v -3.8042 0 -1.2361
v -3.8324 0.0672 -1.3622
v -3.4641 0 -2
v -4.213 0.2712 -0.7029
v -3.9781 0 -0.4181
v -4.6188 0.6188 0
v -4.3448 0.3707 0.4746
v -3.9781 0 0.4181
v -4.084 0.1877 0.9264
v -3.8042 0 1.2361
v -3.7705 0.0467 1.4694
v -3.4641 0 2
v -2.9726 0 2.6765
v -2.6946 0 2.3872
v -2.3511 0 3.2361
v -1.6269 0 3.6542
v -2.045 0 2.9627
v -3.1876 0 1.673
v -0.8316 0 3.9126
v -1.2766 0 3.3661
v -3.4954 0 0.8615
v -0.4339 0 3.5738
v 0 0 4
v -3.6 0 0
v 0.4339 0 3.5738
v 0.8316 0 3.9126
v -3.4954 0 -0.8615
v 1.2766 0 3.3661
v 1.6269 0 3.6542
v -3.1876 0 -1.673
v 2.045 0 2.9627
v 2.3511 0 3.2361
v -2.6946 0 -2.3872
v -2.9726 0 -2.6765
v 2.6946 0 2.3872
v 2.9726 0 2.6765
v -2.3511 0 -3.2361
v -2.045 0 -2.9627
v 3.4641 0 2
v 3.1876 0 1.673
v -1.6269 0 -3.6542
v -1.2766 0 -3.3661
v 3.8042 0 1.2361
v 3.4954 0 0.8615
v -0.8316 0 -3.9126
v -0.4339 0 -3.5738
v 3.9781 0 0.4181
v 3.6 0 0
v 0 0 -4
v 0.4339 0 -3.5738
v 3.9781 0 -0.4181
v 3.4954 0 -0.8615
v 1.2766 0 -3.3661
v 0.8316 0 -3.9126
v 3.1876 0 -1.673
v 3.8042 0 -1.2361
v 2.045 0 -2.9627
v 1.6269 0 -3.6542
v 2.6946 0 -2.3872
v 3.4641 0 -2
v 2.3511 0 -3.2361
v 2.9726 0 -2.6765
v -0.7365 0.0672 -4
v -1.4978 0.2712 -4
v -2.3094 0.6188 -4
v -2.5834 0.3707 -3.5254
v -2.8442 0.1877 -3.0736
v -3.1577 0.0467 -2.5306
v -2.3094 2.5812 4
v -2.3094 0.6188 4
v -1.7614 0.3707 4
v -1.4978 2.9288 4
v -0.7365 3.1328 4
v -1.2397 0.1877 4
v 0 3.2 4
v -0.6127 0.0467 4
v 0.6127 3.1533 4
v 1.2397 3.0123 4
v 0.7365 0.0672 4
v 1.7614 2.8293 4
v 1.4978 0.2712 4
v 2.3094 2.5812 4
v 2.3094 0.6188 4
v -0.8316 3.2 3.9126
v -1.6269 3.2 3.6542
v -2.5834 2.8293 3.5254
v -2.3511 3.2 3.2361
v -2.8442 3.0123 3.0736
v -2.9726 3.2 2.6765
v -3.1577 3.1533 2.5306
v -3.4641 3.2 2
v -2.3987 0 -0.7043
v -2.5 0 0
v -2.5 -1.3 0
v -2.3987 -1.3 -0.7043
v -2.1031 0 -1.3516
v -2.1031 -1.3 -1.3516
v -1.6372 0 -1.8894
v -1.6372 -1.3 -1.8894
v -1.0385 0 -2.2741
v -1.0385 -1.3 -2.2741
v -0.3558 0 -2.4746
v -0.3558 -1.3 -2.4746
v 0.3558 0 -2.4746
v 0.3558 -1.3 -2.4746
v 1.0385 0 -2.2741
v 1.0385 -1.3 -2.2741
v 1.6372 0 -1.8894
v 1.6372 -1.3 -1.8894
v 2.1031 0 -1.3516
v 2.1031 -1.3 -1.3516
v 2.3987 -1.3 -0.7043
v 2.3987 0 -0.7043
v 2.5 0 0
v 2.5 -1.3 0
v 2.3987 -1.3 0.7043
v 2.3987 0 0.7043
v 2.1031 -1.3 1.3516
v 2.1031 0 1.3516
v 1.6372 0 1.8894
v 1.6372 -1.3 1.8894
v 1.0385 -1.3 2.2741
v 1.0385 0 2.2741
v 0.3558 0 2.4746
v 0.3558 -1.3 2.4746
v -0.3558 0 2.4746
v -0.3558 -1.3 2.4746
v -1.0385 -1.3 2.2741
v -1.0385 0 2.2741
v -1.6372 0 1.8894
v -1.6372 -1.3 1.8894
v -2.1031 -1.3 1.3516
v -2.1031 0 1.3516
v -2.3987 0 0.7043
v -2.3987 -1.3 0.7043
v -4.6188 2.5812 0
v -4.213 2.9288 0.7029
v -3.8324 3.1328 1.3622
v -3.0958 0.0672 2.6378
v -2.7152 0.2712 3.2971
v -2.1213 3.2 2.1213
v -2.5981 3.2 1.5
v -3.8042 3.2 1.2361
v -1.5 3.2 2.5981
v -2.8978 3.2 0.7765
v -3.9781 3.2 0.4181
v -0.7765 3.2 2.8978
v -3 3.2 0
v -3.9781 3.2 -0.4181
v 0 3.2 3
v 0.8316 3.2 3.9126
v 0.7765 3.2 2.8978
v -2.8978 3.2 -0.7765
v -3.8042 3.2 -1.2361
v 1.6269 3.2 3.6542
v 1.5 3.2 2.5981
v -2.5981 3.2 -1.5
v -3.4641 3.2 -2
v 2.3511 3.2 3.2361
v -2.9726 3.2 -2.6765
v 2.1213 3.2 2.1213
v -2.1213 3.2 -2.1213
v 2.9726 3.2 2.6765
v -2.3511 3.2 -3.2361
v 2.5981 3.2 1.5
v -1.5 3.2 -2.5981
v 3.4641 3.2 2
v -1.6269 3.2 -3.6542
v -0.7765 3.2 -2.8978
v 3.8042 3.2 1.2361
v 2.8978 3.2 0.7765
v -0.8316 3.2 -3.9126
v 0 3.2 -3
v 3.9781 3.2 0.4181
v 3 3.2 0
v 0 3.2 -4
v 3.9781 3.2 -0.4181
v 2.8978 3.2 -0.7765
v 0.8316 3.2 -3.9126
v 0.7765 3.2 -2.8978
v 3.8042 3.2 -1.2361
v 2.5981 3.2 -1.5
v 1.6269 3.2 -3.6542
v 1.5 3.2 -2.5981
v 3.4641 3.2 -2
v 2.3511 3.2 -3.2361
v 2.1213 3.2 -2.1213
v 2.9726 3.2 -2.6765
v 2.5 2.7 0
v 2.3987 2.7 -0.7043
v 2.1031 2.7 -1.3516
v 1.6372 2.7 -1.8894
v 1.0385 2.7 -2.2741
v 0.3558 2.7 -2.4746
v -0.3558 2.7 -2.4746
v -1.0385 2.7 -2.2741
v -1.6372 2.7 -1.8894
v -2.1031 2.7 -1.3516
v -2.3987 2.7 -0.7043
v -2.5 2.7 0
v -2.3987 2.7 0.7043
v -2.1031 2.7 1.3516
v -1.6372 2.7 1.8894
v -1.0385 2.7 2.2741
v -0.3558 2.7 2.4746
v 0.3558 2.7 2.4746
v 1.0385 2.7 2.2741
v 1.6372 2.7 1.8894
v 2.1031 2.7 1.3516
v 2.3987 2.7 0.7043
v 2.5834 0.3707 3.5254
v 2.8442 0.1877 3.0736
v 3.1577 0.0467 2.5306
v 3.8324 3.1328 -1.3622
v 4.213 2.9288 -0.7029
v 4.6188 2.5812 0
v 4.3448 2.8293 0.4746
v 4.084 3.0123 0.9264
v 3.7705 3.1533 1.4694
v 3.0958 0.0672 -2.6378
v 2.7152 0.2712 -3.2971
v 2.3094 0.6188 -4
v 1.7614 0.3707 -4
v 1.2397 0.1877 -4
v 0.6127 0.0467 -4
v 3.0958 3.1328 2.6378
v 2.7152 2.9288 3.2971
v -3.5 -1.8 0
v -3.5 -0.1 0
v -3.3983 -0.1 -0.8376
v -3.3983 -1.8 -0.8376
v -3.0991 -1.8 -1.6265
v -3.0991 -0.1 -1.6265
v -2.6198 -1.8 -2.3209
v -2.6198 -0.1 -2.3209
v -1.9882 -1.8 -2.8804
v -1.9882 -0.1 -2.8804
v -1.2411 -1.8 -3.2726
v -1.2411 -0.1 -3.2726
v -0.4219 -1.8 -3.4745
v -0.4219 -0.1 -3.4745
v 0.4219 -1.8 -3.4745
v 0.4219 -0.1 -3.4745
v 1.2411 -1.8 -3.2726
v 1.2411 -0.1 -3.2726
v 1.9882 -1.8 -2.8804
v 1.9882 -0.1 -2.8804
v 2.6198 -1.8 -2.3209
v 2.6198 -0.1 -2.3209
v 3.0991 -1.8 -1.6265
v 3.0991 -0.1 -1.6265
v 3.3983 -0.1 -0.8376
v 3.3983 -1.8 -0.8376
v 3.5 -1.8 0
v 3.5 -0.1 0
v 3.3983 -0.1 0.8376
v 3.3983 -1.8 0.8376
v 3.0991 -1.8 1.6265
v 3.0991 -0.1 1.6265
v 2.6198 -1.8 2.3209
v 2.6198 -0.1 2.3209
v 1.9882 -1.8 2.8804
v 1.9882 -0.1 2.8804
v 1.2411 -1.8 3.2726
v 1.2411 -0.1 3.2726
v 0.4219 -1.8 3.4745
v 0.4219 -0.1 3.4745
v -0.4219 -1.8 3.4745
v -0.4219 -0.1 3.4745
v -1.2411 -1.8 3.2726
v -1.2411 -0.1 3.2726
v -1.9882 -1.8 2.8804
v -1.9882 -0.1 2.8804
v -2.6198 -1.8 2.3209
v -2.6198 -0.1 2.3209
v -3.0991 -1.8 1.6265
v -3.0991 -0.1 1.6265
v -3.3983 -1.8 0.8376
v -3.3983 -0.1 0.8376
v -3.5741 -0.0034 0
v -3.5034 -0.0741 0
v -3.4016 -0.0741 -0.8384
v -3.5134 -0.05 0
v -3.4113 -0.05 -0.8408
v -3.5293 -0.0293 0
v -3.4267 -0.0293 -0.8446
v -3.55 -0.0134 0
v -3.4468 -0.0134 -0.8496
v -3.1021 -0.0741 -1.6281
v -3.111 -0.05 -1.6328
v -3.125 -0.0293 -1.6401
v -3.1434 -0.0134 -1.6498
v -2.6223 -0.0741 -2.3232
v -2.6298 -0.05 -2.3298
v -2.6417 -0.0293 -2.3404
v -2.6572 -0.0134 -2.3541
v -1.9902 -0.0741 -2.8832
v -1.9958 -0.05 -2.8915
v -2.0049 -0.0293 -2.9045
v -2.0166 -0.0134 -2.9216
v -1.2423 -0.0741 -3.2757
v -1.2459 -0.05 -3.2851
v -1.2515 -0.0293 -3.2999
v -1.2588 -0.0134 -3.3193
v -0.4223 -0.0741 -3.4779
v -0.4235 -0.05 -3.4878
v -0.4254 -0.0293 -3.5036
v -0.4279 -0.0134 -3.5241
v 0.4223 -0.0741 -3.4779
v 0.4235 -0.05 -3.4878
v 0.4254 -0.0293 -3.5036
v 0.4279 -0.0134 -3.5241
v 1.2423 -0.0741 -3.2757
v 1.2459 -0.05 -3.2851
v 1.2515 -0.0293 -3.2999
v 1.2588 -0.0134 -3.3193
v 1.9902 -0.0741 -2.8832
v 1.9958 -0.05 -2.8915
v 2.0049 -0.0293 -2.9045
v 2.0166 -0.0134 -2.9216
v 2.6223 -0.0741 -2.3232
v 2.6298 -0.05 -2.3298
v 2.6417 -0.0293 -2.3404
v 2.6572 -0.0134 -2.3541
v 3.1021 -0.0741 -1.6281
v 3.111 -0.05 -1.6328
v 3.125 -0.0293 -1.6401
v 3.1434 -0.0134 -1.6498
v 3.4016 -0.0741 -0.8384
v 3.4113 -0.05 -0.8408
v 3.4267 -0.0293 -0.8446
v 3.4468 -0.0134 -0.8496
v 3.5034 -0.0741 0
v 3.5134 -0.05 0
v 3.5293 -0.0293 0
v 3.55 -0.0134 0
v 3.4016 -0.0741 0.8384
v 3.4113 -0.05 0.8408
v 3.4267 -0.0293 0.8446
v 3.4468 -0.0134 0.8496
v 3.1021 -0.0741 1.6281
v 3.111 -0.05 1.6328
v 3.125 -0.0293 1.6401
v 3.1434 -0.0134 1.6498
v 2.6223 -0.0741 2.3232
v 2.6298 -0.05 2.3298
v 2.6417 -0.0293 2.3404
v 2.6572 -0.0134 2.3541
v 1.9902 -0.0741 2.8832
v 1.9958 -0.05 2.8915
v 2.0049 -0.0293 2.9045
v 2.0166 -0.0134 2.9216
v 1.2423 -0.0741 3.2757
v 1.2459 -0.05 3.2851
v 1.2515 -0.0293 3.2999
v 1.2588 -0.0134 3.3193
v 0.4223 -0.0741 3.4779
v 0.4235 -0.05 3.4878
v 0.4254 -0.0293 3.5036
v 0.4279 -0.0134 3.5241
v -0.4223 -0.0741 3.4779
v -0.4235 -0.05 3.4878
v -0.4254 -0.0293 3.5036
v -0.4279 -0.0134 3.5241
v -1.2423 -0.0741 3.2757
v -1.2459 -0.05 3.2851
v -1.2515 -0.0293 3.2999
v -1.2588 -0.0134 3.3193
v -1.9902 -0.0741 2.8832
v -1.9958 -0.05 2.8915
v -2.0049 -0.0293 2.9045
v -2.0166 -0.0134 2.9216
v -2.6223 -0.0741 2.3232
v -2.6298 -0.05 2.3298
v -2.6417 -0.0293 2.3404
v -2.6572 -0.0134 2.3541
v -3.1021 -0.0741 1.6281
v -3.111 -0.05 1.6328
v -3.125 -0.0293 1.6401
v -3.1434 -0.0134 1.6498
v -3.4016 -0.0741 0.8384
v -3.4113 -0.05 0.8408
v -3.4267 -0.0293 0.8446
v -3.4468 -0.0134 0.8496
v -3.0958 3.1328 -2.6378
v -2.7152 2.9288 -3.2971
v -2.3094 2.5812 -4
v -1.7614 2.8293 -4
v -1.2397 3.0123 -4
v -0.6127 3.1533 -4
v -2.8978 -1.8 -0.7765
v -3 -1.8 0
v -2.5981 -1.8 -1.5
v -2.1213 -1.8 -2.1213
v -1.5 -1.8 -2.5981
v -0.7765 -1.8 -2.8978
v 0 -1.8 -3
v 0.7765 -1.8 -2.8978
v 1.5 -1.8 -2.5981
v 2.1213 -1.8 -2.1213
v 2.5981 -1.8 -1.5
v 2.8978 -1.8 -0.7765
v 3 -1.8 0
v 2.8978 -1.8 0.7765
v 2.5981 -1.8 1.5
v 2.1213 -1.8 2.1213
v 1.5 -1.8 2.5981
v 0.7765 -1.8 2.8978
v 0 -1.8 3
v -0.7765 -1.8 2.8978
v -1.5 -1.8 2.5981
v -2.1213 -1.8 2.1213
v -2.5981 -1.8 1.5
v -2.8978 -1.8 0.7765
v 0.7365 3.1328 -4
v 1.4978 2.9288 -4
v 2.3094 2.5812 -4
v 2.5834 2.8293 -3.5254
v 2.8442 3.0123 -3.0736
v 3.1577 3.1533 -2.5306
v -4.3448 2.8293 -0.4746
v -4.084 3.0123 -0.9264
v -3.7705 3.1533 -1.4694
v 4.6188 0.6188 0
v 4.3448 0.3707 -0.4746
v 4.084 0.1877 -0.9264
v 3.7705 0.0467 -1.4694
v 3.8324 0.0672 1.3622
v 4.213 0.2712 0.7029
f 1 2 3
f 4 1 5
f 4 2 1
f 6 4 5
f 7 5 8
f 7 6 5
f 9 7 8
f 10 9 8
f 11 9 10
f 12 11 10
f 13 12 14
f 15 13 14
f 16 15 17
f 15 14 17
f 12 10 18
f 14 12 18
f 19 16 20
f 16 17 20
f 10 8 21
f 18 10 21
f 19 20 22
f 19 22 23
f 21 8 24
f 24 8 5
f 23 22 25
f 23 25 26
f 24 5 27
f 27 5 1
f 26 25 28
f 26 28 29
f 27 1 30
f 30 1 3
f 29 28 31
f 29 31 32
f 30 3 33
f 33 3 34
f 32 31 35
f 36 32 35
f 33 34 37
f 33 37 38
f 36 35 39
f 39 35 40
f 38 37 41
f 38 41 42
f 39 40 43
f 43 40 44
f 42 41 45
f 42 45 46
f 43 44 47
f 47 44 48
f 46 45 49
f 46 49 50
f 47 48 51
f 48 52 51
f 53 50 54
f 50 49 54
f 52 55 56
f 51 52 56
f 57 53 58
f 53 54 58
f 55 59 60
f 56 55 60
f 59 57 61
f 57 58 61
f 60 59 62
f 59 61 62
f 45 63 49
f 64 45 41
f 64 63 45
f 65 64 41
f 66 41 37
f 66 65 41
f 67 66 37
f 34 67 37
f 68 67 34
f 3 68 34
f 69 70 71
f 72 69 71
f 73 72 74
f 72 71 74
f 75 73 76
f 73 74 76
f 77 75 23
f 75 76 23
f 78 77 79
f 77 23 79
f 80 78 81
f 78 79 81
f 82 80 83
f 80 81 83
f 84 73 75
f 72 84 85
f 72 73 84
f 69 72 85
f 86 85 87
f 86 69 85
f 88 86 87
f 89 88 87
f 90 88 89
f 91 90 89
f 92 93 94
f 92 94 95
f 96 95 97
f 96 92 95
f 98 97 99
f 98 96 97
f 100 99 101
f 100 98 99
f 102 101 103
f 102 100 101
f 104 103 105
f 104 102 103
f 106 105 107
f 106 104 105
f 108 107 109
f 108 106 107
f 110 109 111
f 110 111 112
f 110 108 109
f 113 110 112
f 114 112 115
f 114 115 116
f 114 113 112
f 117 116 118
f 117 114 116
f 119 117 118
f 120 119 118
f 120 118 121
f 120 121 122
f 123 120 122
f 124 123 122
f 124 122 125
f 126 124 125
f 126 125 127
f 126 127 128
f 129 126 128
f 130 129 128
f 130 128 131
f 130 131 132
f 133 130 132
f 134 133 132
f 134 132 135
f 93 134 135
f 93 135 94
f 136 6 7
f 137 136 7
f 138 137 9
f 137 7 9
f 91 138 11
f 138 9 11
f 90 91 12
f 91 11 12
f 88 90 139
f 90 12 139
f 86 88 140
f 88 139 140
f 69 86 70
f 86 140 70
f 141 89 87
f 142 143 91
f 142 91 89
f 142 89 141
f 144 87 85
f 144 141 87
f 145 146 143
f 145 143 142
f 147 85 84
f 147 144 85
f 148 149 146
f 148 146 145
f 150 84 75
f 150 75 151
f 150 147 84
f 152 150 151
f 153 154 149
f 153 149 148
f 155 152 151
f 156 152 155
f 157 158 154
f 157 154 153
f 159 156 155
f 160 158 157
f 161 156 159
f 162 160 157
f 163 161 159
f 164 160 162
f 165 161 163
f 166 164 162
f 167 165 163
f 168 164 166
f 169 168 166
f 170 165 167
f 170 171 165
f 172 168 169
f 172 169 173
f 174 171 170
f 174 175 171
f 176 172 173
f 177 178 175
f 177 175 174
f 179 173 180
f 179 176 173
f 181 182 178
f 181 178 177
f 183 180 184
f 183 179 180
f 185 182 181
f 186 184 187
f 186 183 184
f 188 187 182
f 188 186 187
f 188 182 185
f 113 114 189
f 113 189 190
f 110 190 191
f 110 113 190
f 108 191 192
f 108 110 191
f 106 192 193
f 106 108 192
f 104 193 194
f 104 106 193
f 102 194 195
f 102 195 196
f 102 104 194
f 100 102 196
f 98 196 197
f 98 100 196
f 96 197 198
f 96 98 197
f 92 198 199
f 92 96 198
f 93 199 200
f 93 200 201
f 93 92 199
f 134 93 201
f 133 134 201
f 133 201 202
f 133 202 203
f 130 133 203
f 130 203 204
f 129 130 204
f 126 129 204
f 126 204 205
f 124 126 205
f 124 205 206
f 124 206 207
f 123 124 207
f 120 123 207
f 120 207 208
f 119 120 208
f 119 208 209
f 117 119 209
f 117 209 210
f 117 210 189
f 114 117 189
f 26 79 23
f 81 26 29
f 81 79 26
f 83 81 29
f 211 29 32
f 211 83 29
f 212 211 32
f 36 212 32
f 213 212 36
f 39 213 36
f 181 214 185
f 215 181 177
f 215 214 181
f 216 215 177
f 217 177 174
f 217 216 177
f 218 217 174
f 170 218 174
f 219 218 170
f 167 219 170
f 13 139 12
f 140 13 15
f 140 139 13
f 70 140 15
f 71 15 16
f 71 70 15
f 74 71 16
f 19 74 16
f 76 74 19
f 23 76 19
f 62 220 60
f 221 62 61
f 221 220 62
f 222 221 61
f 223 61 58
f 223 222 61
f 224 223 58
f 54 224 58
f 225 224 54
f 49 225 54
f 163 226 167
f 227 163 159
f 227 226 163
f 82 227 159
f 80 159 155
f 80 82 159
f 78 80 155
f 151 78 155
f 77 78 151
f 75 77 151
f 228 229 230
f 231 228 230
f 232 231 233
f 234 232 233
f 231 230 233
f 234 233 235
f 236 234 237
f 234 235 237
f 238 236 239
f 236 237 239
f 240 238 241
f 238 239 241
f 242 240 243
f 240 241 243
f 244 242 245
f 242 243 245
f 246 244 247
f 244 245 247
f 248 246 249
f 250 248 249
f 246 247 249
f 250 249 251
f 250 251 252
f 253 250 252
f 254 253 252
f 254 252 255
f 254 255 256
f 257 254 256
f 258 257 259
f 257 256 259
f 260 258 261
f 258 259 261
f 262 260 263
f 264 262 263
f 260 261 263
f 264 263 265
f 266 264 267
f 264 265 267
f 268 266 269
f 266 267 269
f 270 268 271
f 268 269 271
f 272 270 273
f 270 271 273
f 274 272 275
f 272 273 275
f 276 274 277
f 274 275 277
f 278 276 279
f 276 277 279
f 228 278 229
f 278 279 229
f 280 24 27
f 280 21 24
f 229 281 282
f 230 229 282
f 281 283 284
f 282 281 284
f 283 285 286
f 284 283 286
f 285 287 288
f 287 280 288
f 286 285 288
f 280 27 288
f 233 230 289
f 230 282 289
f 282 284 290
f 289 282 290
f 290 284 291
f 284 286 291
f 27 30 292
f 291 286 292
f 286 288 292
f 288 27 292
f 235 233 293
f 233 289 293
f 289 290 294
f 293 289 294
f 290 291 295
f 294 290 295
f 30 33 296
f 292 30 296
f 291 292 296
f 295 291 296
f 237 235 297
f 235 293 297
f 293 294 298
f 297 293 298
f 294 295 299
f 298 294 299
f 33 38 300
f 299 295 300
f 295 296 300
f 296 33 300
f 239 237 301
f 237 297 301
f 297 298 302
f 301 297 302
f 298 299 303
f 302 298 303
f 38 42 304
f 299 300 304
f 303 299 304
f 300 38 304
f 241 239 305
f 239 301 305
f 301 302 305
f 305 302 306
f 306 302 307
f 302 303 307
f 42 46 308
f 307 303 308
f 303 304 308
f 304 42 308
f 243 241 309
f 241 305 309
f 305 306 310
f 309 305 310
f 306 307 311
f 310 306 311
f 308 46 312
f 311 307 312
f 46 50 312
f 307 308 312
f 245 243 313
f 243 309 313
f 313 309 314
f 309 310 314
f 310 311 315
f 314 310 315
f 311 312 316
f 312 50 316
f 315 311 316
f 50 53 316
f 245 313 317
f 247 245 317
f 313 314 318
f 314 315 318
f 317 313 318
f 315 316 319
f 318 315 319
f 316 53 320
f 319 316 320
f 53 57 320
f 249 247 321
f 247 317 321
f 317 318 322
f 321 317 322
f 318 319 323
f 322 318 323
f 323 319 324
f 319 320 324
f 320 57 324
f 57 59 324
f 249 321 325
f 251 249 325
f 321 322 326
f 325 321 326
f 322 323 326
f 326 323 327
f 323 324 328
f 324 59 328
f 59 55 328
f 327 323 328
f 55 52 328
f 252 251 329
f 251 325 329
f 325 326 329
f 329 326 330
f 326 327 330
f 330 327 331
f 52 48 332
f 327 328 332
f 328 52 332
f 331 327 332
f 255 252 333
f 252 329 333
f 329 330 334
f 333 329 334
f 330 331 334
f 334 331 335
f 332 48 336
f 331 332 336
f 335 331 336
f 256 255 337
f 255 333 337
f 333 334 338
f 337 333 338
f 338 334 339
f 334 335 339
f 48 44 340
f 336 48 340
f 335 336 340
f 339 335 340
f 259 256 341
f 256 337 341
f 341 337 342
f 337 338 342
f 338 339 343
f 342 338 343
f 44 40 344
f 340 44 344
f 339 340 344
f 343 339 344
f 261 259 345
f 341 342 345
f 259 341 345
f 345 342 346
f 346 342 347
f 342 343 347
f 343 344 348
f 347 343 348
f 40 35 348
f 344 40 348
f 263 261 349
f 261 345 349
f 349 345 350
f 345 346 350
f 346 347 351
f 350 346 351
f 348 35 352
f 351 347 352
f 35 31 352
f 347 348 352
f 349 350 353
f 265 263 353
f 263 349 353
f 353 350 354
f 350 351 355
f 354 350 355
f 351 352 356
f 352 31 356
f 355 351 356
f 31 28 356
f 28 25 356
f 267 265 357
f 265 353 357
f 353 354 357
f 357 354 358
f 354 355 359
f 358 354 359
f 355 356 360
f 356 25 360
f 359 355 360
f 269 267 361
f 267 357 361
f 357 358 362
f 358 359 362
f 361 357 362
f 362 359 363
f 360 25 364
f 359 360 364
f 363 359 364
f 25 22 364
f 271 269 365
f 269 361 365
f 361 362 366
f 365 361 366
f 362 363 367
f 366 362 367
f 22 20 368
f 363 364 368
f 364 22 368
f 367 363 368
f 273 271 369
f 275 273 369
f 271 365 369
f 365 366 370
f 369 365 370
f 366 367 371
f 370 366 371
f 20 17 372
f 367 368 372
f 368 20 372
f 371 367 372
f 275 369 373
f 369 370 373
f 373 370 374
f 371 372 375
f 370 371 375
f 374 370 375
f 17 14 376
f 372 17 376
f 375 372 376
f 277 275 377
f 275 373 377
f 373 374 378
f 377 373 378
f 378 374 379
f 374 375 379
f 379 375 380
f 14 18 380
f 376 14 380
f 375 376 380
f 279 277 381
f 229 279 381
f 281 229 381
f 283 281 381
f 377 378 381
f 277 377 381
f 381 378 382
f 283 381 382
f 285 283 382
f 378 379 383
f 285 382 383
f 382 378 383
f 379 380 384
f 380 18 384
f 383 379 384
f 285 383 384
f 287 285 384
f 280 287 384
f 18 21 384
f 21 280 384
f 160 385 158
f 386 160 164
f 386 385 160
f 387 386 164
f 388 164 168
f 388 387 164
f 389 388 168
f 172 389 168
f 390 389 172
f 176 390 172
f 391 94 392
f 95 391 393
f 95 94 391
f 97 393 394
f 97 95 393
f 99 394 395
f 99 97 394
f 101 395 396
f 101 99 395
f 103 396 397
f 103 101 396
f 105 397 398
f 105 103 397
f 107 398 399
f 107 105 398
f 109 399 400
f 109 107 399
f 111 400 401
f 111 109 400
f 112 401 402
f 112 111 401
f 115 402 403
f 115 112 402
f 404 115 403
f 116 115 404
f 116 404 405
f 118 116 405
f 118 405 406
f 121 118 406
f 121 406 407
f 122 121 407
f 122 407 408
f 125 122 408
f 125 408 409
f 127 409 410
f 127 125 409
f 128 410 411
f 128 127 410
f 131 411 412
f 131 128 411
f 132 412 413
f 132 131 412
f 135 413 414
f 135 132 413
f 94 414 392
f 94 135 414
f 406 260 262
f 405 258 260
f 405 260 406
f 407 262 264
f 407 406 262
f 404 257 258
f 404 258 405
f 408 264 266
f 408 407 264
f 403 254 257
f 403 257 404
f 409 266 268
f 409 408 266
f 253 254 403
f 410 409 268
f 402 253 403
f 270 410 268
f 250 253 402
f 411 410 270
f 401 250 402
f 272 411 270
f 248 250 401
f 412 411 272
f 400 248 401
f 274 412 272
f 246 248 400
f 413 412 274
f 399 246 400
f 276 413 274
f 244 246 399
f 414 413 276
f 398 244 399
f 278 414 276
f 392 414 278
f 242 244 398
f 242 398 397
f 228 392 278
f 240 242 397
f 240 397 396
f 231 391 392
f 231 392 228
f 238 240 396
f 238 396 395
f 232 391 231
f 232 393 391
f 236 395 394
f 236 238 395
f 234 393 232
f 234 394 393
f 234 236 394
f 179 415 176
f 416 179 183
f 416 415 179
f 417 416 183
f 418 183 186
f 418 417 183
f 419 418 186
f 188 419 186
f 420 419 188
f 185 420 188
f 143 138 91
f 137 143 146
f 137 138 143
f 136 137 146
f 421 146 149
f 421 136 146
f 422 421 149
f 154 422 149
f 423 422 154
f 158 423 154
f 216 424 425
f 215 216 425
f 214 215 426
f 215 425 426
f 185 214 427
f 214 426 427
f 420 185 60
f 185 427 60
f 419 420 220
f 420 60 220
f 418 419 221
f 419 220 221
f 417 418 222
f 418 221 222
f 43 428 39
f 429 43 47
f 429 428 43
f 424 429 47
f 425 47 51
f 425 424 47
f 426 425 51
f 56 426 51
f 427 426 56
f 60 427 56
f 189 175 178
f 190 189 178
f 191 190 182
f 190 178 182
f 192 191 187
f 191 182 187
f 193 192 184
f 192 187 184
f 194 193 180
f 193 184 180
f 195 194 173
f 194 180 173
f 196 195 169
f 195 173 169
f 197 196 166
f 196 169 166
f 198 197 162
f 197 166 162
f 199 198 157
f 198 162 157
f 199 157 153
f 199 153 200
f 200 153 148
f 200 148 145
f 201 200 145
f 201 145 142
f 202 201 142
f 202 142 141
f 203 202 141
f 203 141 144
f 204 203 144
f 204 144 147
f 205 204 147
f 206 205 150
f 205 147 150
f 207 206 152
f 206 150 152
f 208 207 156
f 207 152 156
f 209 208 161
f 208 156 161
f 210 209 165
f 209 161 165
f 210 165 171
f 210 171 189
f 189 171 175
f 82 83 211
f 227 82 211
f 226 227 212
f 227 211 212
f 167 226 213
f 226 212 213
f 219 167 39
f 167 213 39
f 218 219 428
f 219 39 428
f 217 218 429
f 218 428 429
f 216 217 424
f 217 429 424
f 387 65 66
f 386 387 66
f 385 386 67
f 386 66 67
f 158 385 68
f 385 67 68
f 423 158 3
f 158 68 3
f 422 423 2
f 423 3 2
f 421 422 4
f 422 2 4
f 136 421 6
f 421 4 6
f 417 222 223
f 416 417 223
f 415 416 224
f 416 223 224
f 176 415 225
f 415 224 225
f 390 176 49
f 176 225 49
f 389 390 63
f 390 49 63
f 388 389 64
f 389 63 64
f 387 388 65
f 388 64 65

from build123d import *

# Parameters (mm, degrees)
SZKIC1_R                    = 2.5
DODANIE_WYCI_GNI_CIE1_DEPTH = 3.2
SZKIC2_OUTSIDE_W            = 22.164
SZKIC2_OUTSIDE_H            = 20.926
SZKIC2_OUTSIDE_R            = 4
WYTNIJ_WYCI_GNI_CIE29_DEPTH = 4.2
WYTNIJ_WYCI_GNI_CIE29_TAPER = 45
SZKIC4_R                    = 3.5
SZKIC4_R_2                  = 2.5
DODANIE_WYCI_GNI_CIE2_DEPTH = 1.8
SZKIC5_OUTSIDE_W            = 33.878
SZKIC5_OUTSIDE_H            = 32.64
SZKIC5_OUTSIDE_R            = 4
WYTNIJ_WYCI_GNI_CIE30_DEPTH = 10
WYTNIJ_WYCI_GNI_CIE30_TAPER = 45
ZAOKR_GLENIE1_R             = 0.1
SFAZOWANIE1_SIZE            = 0.5


with BuildPart() as part:
    # Szkic1 → Dodanie-wyciągnięcie1 (new body)
    with BuildSketch(Plane(origin=(0, 0, 0), x_dir=(1, 0, 0), z_dir=(0, 1, 0))):
        Polygon((4.618802154, 0), (2.309401077, 4), (-2.309401077, 4), (-4.618802154, 0), (-2.309401077, -4), (2.309401077, -4), align=None)
        Circle(SZKIC1_R, mode=Mode.SUBTRACT)
    extrude(amount=DODANIE_WYCI_GNI_CIE1_DEPTH)

    # Szkic2 outside → Wytnij-wyciągnięcie29 (cut, through all)
    with BuildSketch(Plane(origin=(0, 3.2, 0), x_dir=(1, 0, 0), z_dir=(0, 1, 0))):
        Rectangle(SZKIC2_OUTSIDE_W, SZKIC2_OUTSIDE_H)
        Circle(SZKIC2_OUTSIDE_R, mode=Mode.SUBTRACT)
    extrude(amount=-WYTNIJ_WYCI_GNI_CIE29_DEPTH, taper=WYTNIJ_WYCI_GNI_CIE29_TAPER, mode=Mode.SUBTRACT)

    # Szkic4 → Dodanie-wyciągnięcie2 (add)
    with BuildSketch(Plane(origin=(0, 0, 0), x_dir=(-1, 0, 0), z_dir=(0, -1, 0))):
        Circle(SZKIC4_R)
        Circle(SZKIC4_R_2, mode=Mode.SUBTRACT)
    extrude(amount=DODANIE_WYCI_GNI_CIE2_DEPTH)

    # Szkic5 outside → Wytnij-wyciągnięcie30 (cut)
    with BuildSketch(Plane(origin=(0, 0, 0), x_dir=(-1, 0, 0), z_dir=(0, -1, 0))):
        Rectangle(SZKIC5_OUTSIDE_W, SZKIC5_OUTSIDE_H)
        Circle(SZKIC5_OUTSIDE_R, mode=Mode.SUBTRACT)
    extrude(amount=-WYTNIJ_WYCI_GNI_CIE30_DEPTH, taper=WYTNIJ_WYCI_GNI_CIE30_TAPER, mode=Mode.SUBTRACT)

    # Zaokrąglenie1
    zaokr_glenie1_edges = [part.edges().sort_by_distance(p)[0] for p in [
        (3.5, 0, 0),
    ]]
    fillet(zaokr_glenie1_edges, radius=ZAOKR_GLENIE1_R)

    # Sfazowanie1
    sfazowanie1_edges = [part.edges().sort_by_distance(p)[0] for p in [
        (-2.5, 3.2, 0),
        (2.5, -1.8, 0),
    ]]
    chamfer(sfazowanie1_edges, length=SFAZOWANIE1_SIZE)


solid = part.part
